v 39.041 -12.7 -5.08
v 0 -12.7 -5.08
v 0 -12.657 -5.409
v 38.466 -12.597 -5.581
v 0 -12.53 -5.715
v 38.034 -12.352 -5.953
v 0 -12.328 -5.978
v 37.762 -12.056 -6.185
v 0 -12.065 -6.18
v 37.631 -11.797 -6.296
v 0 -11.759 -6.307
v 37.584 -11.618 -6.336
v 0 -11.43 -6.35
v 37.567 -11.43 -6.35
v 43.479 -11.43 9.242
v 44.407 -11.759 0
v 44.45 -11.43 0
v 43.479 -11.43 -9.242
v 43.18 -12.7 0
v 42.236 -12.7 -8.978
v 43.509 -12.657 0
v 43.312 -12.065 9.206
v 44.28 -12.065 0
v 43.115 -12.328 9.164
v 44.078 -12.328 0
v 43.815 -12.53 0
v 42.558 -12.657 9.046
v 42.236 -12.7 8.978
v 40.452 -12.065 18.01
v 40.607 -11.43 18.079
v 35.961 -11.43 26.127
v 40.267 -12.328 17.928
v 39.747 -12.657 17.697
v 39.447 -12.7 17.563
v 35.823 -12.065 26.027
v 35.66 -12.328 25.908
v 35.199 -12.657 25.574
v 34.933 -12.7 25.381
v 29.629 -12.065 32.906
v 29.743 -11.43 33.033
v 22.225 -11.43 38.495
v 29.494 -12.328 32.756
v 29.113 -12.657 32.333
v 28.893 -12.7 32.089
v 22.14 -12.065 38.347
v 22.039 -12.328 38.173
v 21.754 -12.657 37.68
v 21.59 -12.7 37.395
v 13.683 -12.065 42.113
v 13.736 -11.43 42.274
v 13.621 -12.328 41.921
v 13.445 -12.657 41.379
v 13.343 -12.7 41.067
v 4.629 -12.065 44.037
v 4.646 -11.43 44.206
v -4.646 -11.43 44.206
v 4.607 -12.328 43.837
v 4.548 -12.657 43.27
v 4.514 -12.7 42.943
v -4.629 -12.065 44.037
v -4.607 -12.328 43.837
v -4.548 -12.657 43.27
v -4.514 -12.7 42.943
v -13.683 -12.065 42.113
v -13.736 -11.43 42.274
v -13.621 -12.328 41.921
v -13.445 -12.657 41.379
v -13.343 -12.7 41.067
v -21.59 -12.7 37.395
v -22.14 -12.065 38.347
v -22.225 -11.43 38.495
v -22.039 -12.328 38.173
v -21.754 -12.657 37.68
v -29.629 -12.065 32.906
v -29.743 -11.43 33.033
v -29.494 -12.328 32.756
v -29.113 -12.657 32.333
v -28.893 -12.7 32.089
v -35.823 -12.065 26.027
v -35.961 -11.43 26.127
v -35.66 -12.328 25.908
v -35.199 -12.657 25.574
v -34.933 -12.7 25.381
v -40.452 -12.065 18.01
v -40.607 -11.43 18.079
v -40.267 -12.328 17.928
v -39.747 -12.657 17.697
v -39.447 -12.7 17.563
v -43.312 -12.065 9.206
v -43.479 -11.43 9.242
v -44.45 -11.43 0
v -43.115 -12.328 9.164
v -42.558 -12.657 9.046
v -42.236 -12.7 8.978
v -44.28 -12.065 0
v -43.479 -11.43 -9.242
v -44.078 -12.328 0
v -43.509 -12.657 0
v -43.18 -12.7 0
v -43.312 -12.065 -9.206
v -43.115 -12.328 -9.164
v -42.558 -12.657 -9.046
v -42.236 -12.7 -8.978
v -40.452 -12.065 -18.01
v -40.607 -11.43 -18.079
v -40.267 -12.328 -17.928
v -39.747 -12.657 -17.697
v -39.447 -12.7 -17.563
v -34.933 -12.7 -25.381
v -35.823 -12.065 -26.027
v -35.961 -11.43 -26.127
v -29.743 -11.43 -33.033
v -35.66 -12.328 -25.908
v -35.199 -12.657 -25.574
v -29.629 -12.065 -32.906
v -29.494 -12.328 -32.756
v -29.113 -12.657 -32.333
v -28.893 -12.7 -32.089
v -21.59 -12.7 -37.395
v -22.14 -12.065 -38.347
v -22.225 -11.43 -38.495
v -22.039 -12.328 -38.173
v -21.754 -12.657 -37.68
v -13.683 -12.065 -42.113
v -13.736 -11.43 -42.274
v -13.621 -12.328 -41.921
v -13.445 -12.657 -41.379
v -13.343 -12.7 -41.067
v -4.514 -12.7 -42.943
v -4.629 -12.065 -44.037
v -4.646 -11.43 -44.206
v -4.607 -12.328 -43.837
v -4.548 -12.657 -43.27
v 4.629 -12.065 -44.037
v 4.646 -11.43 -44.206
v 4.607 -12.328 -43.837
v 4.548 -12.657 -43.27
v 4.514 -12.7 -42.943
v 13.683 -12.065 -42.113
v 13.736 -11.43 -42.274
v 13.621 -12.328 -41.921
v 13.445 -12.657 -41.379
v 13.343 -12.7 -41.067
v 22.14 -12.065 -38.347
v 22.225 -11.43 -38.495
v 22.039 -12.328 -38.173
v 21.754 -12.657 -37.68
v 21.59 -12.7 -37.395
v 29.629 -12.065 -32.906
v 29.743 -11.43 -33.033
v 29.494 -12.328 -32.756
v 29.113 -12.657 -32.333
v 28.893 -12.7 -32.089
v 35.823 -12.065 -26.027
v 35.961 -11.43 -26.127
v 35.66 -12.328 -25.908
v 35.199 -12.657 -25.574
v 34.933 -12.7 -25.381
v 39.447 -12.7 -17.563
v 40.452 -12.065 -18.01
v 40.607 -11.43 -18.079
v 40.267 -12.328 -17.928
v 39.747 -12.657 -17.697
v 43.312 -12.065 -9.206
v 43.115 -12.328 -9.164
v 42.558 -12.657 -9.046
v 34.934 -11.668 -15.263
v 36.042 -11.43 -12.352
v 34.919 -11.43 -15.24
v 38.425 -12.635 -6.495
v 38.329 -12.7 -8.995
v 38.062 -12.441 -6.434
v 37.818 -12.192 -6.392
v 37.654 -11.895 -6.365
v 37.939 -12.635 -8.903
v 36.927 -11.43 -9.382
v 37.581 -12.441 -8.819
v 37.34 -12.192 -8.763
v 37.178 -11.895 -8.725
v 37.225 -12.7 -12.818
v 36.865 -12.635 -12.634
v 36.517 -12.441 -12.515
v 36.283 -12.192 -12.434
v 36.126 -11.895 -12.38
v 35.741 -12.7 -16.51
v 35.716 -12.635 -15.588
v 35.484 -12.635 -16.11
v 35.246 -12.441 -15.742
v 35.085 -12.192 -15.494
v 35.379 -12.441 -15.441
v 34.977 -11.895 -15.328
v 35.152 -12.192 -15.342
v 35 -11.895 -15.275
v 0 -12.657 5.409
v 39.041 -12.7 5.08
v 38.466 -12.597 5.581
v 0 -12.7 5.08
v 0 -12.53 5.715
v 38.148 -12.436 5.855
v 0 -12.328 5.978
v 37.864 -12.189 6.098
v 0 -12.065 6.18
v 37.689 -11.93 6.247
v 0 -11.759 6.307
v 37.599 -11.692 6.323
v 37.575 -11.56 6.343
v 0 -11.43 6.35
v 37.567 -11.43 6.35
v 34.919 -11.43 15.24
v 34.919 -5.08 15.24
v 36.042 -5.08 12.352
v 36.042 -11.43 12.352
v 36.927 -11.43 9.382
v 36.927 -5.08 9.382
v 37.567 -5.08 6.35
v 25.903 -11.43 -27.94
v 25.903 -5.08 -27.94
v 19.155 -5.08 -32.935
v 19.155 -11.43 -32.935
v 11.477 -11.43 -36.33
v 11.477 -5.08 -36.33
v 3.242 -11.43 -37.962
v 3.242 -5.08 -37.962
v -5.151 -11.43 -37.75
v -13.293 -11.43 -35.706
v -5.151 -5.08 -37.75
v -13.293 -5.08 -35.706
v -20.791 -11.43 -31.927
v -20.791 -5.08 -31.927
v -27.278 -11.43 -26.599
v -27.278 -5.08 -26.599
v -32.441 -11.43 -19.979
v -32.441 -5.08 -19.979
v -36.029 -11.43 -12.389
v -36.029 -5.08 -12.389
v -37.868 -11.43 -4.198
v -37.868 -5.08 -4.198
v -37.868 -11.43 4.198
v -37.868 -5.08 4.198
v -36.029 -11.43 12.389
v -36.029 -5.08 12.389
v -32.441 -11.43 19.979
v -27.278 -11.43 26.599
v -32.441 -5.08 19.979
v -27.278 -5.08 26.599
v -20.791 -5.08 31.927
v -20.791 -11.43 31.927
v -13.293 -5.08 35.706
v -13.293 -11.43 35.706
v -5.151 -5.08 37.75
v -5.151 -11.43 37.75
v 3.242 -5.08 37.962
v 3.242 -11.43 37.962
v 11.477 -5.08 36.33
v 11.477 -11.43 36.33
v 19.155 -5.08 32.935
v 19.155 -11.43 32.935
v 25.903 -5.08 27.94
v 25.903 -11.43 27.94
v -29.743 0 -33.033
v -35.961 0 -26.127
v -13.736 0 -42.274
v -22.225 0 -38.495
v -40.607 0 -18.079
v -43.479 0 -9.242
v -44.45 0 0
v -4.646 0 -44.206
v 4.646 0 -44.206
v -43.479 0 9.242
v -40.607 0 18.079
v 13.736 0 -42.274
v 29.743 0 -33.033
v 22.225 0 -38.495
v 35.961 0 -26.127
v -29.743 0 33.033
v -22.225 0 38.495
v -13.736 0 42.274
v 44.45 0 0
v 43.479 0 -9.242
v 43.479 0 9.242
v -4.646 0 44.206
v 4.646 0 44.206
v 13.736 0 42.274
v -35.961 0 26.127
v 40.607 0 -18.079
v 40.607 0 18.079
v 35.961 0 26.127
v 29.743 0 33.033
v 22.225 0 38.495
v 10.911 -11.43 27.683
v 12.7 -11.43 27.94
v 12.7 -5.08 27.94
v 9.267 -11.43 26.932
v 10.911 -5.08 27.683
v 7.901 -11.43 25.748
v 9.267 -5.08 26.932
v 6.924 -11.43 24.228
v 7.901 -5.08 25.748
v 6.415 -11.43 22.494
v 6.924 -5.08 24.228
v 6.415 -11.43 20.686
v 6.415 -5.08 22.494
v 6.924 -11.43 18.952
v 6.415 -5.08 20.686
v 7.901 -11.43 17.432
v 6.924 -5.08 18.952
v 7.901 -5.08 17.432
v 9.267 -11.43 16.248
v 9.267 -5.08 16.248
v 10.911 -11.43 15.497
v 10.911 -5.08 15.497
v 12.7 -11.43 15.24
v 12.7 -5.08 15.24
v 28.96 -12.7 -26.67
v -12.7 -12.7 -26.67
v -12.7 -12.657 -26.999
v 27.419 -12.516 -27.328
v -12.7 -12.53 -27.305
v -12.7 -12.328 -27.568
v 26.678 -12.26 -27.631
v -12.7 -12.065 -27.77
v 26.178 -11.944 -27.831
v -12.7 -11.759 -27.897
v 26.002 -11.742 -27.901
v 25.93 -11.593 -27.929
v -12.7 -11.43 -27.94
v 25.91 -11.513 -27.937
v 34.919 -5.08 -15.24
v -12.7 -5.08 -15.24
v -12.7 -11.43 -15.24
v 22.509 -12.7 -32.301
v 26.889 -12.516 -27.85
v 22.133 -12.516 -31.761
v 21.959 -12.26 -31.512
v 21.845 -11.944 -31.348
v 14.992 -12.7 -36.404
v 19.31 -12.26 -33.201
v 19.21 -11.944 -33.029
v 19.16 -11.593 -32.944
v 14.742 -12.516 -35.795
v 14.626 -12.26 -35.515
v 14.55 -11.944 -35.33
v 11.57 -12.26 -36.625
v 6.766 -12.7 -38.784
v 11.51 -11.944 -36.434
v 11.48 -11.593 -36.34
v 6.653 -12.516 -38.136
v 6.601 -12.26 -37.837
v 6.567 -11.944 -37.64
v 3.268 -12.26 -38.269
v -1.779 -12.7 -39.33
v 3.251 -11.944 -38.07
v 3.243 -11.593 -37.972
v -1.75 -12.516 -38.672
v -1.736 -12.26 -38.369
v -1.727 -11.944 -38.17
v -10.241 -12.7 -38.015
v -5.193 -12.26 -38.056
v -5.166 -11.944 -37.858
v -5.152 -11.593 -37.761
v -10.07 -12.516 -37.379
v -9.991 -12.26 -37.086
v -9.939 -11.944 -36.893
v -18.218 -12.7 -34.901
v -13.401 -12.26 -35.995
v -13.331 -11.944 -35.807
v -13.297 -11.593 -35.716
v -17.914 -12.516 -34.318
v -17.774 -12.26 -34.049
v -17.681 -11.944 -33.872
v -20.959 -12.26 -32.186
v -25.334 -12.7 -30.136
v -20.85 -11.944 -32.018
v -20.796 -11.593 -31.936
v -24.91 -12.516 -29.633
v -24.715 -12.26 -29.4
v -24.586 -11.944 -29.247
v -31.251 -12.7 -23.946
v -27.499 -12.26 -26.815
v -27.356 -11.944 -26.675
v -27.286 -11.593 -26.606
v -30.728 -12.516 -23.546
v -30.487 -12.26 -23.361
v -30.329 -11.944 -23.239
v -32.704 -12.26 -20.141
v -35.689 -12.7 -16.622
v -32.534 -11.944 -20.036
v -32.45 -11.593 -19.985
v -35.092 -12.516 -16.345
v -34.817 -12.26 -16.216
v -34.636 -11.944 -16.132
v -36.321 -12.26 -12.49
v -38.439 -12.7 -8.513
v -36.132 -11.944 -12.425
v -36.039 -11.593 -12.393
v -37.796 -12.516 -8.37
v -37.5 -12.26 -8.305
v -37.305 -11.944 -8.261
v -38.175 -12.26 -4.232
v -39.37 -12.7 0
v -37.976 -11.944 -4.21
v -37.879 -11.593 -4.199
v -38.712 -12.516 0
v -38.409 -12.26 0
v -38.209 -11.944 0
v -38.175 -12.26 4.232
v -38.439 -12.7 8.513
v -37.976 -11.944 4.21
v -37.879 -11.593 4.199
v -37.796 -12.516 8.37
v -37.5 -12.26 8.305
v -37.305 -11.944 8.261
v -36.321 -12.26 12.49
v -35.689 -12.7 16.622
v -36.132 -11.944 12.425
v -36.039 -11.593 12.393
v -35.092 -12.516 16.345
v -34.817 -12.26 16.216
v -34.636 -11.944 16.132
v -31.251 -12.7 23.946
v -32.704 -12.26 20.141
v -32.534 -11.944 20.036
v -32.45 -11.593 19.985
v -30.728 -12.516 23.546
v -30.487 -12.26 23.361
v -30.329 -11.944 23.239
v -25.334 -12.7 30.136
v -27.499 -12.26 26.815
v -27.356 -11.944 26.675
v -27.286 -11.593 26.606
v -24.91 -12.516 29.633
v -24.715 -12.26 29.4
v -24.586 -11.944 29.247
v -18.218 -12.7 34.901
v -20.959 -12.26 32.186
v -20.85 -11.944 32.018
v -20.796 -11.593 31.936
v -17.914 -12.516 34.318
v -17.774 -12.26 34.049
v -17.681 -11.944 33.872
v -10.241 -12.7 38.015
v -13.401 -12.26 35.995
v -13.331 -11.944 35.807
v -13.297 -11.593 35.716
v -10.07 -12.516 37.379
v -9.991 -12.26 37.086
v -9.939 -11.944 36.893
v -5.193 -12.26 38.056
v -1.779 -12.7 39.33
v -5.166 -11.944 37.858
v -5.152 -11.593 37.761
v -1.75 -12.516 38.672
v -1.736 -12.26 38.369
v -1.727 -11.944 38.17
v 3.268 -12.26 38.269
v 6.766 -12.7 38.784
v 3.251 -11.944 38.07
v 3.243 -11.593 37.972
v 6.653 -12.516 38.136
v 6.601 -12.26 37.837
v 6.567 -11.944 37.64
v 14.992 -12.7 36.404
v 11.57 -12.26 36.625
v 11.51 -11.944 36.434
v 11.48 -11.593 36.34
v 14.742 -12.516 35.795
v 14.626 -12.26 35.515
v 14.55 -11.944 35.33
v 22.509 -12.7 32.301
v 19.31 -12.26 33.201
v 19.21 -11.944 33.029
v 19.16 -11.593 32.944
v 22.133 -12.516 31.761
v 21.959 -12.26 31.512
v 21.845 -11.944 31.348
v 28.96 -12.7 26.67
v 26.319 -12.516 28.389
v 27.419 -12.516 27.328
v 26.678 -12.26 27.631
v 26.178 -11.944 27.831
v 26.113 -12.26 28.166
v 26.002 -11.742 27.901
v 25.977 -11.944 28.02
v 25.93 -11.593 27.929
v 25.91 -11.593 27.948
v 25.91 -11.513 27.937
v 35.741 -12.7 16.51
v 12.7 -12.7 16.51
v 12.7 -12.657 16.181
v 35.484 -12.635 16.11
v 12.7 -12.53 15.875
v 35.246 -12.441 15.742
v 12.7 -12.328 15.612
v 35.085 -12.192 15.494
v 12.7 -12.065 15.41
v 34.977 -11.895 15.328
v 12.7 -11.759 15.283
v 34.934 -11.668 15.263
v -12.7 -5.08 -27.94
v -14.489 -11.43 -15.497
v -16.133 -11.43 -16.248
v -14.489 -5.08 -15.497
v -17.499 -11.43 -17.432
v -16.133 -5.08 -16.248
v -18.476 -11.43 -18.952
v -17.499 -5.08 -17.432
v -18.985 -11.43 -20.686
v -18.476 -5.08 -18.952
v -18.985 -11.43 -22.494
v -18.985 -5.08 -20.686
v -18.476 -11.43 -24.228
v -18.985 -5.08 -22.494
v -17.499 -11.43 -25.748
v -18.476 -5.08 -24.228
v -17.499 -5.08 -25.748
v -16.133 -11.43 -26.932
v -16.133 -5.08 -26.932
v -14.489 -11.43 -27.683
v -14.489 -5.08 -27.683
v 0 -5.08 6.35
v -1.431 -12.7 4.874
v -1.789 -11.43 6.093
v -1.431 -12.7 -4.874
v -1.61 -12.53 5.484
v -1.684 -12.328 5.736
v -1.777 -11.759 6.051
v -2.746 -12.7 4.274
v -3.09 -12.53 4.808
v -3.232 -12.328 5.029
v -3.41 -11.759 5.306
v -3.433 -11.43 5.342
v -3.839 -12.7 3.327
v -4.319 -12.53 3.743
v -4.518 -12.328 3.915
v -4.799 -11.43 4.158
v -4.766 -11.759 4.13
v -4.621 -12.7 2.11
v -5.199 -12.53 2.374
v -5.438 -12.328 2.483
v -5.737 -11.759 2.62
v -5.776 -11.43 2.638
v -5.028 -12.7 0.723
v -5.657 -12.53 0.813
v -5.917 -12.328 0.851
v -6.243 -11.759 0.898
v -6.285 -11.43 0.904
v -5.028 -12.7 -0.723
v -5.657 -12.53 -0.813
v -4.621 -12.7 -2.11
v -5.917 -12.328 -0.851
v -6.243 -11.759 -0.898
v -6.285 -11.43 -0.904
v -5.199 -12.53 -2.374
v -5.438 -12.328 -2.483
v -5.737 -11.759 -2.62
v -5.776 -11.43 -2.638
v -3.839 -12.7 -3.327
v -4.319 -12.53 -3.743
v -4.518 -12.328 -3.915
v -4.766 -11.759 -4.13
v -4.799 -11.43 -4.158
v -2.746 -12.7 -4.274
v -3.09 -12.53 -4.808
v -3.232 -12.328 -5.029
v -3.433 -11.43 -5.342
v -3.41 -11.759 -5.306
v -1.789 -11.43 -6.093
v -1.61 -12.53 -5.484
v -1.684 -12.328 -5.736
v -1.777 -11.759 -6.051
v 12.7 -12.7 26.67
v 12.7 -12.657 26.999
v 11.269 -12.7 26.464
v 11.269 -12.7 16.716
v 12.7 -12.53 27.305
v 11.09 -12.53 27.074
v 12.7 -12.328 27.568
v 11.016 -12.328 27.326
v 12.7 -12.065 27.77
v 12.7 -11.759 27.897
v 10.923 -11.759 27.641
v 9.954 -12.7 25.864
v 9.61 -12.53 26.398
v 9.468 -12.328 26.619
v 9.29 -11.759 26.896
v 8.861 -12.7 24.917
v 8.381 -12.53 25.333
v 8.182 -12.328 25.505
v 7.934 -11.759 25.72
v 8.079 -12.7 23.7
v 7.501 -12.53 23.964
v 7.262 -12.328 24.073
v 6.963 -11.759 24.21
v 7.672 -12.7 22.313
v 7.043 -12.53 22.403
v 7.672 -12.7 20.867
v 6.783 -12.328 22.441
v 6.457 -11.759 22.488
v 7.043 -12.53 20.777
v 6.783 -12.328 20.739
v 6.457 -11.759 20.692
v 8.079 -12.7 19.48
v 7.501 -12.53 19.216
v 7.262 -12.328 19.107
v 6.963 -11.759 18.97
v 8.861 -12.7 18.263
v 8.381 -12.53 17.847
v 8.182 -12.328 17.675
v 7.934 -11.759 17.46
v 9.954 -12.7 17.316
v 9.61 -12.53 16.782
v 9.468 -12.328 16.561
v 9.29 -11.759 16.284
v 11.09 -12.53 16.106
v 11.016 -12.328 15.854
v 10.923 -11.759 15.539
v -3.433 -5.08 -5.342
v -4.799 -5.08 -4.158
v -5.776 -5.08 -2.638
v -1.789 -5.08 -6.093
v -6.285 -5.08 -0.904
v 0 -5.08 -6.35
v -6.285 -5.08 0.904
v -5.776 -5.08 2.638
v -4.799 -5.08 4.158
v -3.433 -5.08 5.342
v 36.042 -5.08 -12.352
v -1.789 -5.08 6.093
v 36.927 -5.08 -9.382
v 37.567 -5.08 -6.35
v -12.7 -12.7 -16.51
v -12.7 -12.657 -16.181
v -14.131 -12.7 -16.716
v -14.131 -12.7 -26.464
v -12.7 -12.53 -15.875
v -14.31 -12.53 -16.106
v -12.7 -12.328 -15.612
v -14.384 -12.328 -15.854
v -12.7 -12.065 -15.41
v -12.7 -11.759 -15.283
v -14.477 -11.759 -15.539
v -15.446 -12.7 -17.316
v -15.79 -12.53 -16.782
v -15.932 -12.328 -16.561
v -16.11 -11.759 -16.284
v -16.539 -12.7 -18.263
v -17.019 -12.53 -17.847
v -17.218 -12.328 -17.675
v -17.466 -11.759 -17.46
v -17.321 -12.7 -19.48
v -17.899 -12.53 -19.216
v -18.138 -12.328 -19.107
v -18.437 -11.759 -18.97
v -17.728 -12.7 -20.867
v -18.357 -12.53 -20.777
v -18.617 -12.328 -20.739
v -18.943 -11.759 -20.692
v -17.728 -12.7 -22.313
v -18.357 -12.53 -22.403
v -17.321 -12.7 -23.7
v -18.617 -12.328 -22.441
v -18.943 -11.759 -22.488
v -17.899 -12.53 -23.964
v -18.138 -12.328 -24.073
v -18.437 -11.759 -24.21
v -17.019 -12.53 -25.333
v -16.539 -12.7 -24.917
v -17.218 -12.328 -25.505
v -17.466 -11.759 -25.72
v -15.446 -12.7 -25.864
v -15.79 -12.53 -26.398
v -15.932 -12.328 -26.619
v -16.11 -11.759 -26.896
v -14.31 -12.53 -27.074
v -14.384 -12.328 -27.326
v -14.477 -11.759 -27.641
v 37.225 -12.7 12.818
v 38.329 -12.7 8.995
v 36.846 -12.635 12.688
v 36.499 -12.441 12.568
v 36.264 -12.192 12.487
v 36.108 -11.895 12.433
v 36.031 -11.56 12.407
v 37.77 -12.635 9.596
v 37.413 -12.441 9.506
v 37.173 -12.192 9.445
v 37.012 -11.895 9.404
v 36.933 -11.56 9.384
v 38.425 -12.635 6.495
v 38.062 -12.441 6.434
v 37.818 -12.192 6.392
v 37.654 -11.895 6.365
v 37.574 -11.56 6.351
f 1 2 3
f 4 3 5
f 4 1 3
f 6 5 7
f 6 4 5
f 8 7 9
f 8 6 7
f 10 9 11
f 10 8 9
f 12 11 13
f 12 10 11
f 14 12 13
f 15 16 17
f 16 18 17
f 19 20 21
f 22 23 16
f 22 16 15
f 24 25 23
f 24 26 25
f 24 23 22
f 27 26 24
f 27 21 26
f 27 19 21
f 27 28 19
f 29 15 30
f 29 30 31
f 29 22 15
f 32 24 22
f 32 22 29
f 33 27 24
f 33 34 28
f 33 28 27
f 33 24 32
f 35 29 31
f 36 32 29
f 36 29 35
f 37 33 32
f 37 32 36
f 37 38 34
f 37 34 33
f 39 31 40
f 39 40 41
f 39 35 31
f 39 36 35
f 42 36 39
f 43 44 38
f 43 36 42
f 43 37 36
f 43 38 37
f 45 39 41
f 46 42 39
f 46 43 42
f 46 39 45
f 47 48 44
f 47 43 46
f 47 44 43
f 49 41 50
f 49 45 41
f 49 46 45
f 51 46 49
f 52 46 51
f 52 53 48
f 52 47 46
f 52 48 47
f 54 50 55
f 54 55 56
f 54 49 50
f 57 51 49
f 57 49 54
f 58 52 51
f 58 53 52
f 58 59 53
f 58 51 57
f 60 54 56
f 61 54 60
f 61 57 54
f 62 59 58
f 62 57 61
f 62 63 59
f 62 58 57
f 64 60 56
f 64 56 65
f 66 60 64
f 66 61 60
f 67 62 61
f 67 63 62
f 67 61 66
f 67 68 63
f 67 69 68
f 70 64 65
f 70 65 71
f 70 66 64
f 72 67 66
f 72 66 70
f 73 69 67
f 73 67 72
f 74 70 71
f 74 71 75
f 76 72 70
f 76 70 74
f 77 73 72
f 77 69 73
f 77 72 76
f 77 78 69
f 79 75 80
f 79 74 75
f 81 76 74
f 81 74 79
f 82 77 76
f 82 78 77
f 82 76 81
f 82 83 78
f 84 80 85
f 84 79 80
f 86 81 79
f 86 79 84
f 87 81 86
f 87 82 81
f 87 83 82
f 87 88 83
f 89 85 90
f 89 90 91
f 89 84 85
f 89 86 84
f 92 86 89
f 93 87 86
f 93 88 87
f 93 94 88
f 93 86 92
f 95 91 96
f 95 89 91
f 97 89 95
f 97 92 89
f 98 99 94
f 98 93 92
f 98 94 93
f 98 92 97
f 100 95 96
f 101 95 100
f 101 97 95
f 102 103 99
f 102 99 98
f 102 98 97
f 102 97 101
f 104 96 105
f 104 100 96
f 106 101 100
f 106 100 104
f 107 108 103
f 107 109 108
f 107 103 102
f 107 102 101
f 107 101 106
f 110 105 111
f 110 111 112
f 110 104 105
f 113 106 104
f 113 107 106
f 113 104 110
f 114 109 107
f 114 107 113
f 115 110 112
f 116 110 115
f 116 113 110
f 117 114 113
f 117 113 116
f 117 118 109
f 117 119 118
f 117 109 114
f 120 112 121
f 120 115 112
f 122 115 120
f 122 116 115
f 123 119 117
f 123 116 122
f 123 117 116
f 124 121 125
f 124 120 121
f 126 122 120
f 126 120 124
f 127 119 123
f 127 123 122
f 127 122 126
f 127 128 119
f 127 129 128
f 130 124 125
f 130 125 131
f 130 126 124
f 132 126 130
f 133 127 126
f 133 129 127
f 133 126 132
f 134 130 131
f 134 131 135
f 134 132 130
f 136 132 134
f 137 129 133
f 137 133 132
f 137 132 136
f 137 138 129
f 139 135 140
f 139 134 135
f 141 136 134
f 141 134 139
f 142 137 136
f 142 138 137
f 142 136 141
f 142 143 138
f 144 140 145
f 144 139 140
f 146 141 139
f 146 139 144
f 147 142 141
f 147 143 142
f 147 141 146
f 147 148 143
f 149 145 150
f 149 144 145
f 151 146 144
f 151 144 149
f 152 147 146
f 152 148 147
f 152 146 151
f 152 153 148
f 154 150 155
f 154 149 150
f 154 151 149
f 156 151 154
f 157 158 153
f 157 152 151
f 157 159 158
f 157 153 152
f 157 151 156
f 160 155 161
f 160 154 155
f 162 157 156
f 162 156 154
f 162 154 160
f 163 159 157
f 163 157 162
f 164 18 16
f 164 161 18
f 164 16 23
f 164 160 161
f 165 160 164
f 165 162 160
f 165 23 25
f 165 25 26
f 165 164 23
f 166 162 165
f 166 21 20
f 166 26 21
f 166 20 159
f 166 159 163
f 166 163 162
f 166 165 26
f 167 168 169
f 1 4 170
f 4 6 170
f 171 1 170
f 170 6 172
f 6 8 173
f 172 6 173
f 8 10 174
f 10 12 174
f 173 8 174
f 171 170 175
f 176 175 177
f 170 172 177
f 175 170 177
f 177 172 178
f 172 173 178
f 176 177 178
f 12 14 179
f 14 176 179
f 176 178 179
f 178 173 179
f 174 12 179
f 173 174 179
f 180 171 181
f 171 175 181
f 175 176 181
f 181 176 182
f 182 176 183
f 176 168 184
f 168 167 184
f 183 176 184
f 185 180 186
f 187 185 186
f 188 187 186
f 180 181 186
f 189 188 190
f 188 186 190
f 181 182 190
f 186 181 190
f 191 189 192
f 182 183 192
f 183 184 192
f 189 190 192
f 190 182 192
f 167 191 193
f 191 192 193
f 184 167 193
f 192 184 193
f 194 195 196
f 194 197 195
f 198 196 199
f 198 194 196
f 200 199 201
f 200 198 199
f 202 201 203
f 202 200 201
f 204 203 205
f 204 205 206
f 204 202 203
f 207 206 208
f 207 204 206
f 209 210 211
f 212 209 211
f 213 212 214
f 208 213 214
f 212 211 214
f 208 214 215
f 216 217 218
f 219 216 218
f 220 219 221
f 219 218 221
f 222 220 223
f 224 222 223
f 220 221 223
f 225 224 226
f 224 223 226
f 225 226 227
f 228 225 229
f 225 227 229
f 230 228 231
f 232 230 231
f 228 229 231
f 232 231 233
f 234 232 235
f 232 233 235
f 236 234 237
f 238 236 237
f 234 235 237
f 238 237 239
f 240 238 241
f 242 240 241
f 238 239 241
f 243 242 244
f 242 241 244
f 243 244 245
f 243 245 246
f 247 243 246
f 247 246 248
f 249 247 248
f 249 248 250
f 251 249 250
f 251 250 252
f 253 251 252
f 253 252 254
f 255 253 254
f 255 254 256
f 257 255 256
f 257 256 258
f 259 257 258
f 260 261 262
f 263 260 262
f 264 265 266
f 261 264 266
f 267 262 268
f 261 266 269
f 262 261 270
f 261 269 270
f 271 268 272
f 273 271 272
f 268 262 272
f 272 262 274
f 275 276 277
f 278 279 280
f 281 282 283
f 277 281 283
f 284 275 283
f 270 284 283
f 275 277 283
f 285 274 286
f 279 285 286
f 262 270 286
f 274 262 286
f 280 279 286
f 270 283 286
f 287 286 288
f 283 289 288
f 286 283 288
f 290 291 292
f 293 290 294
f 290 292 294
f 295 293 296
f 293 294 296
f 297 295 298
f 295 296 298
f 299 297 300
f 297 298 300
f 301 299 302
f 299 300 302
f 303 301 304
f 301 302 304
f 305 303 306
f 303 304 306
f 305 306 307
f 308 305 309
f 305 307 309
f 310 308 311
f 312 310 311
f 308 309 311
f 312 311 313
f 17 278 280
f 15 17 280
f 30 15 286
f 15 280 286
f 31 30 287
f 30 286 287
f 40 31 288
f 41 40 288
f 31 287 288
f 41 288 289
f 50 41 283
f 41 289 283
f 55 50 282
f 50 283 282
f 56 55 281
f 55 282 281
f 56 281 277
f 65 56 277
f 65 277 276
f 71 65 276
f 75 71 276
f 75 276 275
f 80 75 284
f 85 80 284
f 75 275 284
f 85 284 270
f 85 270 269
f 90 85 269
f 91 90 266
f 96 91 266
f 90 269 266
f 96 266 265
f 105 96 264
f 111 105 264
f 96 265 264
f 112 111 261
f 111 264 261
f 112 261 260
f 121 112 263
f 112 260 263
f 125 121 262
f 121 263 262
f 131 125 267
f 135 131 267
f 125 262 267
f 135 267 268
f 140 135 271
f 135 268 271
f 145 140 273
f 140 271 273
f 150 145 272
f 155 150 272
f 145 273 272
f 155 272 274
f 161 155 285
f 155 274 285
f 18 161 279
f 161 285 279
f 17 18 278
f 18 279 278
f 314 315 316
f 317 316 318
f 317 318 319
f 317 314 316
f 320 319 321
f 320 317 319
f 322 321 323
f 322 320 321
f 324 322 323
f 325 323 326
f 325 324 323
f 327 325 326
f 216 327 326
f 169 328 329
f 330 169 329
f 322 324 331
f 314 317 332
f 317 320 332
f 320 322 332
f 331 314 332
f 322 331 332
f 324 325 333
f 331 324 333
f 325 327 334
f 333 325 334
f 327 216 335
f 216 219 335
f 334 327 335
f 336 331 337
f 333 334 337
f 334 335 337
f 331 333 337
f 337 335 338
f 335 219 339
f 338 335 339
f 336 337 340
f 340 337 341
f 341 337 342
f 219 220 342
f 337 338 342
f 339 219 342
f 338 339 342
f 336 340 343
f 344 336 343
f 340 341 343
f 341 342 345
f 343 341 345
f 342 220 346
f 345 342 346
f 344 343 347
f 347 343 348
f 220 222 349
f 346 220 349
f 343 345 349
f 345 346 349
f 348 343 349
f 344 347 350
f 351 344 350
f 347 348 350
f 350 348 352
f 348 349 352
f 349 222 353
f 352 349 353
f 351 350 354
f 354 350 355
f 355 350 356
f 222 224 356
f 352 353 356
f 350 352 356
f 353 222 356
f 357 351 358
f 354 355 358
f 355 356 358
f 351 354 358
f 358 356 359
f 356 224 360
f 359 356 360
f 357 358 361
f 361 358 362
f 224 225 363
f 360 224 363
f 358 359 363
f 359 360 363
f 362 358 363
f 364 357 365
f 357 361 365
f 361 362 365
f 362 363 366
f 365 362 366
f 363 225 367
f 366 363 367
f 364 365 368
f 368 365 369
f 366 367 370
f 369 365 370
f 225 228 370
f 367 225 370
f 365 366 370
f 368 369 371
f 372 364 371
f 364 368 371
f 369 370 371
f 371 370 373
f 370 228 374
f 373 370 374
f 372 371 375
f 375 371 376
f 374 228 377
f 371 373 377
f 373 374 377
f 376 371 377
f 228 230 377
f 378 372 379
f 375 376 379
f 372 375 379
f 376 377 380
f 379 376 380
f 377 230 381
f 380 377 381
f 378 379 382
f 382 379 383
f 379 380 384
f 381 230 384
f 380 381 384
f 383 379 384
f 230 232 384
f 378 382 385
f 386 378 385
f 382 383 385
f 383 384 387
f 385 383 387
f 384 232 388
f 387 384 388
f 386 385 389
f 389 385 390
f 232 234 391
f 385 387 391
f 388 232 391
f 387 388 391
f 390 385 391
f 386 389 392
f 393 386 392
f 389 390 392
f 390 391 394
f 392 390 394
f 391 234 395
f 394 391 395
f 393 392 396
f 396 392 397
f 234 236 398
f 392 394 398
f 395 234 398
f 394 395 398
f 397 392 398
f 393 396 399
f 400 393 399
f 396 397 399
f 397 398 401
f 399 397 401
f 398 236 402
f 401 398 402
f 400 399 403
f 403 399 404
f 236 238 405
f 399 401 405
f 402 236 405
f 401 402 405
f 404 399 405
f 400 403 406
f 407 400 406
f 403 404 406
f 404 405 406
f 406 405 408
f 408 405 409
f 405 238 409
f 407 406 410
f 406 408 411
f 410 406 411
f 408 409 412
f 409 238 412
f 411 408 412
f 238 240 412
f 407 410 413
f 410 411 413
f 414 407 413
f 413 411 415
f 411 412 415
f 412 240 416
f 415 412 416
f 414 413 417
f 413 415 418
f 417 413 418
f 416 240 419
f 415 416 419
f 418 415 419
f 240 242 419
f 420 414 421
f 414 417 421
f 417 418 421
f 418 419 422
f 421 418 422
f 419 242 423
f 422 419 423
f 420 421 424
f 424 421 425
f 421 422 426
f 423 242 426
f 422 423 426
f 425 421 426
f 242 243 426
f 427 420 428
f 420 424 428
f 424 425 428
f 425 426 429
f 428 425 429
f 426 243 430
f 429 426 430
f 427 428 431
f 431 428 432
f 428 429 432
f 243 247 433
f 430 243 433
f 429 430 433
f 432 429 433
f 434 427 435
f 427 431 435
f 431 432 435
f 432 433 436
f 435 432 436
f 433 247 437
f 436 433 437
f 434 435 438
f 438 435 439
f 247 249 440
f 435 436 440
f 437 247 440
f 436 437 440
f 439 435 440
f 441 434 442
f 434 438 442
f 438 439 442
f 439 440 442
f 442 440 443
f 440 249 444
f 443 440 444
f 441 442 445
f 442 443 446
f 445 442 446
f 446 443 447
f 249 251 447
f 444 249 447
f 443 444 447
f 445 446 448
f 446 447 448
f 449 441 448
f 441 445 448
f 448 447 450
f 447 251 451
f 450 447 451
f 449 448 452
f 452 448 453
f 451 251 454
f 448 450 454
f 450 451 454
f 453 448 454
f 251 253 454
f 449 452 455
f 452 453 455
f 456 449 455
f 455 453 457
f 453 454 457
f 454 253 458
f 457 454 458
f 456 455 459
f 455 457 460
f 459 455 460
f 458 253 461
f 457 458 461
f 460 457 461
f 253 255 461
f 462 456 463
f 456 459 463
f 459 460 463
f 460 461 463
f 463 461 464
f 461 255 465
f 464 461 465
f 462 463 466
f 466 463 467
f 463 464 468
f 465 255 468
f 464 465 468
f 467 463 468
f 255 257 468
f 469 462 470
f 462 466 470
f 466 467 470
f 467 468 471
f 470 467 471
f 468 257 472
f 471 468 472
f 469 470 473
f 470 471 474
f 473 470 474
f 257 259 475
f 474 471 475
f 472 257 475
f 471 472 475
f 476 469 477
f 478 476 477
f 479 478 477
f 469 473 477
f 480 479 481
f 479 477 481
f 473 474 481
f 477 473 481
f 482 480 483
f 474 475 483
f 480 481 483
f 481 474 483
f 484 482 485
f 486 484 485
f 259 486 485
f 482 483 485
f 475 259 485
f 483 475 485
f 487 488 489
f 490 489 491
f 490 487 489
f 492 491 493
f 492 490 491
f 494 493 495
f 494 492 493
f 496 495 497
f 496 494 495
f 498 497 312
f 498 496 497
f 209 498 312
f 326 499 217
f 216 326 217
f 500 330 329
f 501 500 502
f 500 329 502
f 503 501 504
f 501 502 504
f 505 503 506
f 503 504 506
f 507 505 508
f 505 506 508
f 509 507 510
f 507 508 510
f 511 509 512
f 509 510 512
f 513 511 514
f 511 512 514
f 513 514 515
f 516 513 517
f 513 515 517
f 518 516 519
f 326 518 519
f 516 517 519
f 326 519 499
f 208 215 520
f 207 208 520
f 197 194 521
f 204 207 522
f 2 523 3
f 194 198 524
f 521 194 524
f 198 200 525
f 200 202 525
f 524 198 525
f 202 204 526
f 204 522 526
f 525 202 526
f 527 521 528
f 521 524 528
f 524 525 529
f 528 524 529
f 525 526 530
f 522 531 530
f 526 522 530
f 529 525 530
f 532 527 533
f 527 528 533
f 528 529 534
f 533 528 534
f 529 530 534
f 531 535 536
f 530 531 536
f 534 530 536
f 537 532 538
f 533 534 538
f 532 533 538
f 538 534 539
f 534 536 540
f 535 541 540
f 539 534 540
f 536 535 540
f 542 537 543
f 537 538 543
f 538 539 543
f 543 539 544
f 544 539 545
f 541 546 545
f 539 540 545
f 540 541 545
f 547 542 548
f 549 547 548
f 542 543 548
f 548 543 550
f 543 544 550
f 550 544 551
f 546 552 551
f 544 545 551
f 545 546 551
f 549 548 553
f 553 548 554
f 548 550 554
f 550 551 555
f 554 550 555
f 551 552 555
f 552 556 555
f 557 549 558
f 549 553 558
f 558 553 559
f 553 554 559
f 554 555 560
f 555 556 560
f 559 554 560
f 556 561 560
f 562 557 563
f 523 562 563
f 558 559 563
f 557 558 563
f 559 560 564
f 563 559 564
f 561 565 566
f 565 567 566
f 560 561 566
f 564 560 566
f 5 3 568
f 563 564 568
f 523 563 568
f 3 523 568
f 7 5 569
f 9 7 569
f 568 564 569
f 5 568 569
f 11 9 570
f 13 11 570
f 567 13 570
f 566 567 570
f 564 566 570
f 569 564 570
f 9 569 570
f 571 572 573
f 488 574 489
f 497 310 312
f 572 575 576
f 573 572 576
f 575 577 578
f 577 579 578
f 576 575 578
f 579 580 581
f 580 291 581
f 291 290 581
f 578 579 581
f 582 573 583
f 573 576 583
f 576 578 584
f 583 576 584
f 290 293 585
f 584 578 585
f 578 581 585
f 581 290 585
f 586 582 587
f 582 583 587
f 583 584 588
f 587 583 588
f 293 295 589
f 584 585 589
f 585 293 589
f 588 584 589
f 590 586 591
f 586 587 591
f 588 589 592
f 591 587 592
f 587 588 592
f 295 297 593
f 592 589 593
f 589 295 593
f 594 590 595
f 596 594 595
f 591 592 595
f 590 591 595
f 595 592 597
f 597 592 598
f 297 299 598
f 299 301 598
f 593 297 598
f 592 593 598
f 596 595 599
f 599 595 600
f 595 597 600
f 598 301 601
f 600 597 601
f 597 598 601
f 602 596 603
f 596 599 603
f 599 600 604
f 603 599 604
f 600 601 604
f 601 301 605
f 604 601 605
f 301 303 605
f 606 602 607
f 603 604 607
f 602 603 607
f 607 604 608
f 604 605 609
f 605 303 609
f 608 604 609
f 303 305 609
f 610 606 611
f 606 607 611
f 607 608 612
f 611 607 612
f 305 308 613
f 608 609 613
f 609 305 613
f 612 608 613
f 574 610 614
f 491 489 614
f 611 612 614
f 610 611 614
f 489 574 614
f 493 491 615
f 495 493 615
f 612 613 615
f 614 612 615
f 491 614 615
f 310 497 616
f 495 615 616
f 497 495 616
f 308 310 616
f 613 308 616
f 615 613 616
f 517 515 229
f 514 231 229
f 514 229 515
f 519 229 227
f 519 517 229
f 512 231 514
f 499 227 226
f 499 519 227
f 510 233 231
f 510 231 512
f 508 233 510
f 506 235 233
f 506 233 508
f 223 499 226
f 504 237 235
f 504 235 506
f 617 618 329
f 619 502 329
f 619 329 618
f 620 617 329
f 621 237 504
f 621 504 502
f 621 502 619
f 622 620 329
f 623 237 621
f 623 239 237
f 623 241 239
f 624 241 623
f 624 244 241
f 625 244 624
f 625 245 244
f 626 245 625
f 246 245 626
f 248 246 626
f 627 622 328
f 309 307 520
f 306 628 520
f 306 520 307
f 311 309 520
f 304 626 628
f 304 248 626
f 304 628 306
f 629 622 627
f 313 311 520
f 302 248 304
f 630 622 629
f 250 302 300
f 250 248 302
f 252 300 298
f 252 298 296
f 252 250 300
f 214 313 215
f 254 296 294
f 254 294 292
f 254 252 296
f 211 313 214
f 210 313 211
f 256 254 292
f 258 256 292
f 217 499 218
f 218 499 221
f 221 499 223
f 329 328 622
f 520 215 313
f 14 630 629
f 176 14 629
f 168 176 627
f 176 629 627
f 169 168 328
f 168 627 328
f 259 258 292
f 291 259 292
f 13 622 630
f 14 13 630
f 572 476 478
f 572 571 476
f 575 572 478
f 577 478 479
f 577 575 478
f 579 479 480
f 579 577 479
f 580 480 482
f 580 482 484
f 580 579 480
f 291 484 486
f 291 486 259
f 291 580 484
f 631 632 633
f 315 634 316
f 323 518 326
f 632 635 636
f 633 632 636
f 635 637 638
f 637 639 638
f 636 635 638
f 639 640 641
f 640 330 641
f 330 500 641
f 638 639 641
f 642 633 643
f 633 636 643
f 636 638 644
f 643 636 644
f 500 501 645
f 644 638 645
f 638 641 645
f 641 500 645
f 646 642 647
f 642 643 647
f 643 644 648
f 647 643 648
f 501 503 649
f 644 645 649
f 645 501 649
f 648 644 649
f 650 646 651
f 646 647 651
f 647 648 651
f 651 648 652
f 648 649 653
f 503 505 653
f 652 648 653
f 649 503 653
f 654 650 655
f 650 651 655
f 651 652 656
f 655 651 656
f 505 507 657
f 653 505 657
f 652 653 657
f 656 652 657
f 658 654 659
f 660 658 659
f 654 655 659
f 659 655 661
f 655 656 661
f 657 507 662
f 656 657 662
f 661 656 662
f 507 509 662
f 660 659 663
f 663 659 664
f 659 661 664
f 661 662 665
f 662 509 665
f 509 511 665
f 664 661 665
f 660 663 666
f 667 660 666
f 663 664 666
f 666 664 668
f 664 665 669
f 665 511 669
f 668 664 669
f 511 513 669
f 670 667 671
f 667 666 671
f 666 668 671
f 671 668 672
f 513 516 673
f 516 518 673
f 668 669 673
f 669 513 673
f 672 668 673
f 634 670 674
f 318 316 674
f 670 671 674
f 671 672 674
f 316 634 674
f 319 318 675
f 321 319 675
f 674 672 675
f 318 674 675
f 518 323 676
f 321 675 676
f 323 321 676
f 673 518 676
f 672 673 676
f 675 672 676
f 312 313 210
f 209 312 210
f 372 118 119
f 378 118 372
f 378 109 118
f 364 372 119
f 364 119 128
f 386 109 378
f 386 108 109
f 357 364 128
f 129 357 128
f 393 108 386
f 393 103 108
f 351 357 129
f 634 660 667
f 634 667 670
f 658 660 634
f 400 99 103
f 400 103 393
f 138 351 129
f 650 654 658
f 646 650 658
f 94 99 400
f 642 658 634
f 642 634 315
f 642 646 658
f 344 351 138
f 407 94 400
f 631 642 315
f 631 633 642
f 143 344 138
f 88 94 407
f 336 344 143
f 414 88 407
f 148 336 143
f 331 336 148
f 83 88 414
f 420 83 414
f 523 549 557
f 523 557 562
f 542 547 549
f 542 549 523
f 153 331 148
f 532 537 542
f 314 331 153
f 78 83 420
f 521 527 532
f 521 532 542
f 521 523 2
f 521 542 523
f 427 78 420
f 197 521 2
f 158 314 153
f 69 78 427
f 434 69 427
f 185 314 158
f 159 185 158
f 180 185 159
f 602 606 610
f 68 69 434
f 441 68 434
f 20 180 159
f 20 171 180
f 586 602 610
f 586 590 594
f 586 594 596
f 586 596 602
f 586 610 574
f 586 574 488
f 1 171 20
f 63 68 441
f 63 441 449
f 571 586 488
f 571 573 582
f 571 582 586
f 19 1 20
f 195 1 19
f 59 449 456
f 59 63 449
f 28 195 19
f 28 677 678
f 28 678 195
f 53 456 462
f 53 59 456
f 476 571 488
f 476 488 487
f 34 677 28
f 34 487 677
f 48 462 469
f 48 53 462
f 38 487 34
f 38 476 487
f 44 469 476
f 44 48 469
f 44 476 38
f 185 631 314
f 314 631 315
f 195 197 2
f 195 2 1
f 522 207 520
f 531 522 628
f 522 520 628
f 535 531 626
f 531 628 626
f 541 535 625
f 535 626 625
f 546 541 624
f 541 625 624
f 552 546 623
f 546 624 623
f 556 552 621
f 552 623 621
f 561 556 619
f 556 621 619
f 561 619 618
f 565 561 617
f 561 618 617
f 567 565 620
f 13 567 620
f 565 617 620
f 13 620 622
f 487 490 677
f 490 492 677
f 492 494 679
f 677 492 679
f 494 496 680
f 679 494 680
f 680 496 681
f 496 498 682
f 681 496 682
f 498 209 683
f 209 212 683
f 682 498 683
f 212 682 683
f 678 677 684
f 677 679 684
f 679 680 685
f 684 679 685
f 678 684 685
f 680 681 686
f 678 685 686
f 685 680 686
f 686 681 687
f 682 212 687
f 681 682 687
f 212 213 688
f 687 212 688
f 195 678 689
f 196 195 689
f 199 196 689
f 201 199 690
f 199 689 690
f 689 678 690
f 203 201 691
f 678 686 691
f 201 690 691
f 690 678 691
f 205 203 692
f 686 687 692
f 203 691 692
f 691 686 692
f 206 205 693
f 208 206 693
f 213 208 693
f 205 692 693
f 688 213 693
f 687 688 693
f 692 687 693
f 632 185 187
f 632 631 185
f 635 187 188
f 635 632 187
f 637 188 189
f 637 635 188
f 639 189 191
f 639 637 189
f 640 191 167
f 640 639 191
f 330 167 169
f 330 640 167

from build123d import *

# Parameters (mm, degrees)
F0_R     = 44.45
F1_DEPTH = 12.7
F2_R     = 44.45
F3_DEPTH = 5.08
F4_R     = 1.27


with BuildPart() as f1:
    # F0 (on Front) → F1 (new body)
    with BuildSketch(Plane.XZ):
        Circle(F0_R)
        with BuildLine():
            ThreePointArc((25.903019, -27.94), (-38.1, 0), (25.903019, 27.94))
            Line((25.903019, 27.94), (12.7, 27.94))
            ThreePointArc((12.7, 27.94), (6.35, 21.59), (12.7, 15.24))
            Line((12.7, 15.24), (34.919227, 15.24))
            ThreePointArc((34.919227, 15.24), (36.514725, 10.875883), (37.567107, 6.35))
            Line((37.567107, 6.35), (0, 6.35))
            ThreePointArc((0, 6.35), (-6.35, 0), (0, -6.35))
            Line((0, -6.35), (37.567107, -6.35))
            ThreePointArc((37.567107, -6.35), (36.514725, -10.875883), (34.919227, -15.24))
            Line((34.919227, -15.24), (0, -15.24))
            Line((0, -15.24), (-12.7, -15.24))
            ThreePointArc((-12.7, -15.24), (-19.05, -21.59), (-12.7, -27.94))
            Line((-12.7, -27.94), (0, -27.94))
            Line((0, -27.94), (25.903019, -27.94))
        make_face(mode=Mode.SUBTRACT)
    extrude(amount=F1_DEPTH)

    # F2 (on Front) → F3 (join)
    with BuildSketch(Plane.XZ):
        Circle(F2_R)
    extrude(amount=F3_DEPTH)

    # F4
    f4_edges = [f1.edges().sort_by_distance(p)[0] for p in [
        (-44.45, -12.7, 0),
        (6.60151, -12.7, -27.94),
        (18.783553, -12.7, -6.35),
        (23.809613, -12.7, 15.24),
        (36.514725, -12.7, -10.875883),
        (36.514725, -12.7, 10.875883),
        (-38.1, -12.7, 0),
    ]]
    fillet(f4_edges, radius=F4_R)


solid = f1.part
